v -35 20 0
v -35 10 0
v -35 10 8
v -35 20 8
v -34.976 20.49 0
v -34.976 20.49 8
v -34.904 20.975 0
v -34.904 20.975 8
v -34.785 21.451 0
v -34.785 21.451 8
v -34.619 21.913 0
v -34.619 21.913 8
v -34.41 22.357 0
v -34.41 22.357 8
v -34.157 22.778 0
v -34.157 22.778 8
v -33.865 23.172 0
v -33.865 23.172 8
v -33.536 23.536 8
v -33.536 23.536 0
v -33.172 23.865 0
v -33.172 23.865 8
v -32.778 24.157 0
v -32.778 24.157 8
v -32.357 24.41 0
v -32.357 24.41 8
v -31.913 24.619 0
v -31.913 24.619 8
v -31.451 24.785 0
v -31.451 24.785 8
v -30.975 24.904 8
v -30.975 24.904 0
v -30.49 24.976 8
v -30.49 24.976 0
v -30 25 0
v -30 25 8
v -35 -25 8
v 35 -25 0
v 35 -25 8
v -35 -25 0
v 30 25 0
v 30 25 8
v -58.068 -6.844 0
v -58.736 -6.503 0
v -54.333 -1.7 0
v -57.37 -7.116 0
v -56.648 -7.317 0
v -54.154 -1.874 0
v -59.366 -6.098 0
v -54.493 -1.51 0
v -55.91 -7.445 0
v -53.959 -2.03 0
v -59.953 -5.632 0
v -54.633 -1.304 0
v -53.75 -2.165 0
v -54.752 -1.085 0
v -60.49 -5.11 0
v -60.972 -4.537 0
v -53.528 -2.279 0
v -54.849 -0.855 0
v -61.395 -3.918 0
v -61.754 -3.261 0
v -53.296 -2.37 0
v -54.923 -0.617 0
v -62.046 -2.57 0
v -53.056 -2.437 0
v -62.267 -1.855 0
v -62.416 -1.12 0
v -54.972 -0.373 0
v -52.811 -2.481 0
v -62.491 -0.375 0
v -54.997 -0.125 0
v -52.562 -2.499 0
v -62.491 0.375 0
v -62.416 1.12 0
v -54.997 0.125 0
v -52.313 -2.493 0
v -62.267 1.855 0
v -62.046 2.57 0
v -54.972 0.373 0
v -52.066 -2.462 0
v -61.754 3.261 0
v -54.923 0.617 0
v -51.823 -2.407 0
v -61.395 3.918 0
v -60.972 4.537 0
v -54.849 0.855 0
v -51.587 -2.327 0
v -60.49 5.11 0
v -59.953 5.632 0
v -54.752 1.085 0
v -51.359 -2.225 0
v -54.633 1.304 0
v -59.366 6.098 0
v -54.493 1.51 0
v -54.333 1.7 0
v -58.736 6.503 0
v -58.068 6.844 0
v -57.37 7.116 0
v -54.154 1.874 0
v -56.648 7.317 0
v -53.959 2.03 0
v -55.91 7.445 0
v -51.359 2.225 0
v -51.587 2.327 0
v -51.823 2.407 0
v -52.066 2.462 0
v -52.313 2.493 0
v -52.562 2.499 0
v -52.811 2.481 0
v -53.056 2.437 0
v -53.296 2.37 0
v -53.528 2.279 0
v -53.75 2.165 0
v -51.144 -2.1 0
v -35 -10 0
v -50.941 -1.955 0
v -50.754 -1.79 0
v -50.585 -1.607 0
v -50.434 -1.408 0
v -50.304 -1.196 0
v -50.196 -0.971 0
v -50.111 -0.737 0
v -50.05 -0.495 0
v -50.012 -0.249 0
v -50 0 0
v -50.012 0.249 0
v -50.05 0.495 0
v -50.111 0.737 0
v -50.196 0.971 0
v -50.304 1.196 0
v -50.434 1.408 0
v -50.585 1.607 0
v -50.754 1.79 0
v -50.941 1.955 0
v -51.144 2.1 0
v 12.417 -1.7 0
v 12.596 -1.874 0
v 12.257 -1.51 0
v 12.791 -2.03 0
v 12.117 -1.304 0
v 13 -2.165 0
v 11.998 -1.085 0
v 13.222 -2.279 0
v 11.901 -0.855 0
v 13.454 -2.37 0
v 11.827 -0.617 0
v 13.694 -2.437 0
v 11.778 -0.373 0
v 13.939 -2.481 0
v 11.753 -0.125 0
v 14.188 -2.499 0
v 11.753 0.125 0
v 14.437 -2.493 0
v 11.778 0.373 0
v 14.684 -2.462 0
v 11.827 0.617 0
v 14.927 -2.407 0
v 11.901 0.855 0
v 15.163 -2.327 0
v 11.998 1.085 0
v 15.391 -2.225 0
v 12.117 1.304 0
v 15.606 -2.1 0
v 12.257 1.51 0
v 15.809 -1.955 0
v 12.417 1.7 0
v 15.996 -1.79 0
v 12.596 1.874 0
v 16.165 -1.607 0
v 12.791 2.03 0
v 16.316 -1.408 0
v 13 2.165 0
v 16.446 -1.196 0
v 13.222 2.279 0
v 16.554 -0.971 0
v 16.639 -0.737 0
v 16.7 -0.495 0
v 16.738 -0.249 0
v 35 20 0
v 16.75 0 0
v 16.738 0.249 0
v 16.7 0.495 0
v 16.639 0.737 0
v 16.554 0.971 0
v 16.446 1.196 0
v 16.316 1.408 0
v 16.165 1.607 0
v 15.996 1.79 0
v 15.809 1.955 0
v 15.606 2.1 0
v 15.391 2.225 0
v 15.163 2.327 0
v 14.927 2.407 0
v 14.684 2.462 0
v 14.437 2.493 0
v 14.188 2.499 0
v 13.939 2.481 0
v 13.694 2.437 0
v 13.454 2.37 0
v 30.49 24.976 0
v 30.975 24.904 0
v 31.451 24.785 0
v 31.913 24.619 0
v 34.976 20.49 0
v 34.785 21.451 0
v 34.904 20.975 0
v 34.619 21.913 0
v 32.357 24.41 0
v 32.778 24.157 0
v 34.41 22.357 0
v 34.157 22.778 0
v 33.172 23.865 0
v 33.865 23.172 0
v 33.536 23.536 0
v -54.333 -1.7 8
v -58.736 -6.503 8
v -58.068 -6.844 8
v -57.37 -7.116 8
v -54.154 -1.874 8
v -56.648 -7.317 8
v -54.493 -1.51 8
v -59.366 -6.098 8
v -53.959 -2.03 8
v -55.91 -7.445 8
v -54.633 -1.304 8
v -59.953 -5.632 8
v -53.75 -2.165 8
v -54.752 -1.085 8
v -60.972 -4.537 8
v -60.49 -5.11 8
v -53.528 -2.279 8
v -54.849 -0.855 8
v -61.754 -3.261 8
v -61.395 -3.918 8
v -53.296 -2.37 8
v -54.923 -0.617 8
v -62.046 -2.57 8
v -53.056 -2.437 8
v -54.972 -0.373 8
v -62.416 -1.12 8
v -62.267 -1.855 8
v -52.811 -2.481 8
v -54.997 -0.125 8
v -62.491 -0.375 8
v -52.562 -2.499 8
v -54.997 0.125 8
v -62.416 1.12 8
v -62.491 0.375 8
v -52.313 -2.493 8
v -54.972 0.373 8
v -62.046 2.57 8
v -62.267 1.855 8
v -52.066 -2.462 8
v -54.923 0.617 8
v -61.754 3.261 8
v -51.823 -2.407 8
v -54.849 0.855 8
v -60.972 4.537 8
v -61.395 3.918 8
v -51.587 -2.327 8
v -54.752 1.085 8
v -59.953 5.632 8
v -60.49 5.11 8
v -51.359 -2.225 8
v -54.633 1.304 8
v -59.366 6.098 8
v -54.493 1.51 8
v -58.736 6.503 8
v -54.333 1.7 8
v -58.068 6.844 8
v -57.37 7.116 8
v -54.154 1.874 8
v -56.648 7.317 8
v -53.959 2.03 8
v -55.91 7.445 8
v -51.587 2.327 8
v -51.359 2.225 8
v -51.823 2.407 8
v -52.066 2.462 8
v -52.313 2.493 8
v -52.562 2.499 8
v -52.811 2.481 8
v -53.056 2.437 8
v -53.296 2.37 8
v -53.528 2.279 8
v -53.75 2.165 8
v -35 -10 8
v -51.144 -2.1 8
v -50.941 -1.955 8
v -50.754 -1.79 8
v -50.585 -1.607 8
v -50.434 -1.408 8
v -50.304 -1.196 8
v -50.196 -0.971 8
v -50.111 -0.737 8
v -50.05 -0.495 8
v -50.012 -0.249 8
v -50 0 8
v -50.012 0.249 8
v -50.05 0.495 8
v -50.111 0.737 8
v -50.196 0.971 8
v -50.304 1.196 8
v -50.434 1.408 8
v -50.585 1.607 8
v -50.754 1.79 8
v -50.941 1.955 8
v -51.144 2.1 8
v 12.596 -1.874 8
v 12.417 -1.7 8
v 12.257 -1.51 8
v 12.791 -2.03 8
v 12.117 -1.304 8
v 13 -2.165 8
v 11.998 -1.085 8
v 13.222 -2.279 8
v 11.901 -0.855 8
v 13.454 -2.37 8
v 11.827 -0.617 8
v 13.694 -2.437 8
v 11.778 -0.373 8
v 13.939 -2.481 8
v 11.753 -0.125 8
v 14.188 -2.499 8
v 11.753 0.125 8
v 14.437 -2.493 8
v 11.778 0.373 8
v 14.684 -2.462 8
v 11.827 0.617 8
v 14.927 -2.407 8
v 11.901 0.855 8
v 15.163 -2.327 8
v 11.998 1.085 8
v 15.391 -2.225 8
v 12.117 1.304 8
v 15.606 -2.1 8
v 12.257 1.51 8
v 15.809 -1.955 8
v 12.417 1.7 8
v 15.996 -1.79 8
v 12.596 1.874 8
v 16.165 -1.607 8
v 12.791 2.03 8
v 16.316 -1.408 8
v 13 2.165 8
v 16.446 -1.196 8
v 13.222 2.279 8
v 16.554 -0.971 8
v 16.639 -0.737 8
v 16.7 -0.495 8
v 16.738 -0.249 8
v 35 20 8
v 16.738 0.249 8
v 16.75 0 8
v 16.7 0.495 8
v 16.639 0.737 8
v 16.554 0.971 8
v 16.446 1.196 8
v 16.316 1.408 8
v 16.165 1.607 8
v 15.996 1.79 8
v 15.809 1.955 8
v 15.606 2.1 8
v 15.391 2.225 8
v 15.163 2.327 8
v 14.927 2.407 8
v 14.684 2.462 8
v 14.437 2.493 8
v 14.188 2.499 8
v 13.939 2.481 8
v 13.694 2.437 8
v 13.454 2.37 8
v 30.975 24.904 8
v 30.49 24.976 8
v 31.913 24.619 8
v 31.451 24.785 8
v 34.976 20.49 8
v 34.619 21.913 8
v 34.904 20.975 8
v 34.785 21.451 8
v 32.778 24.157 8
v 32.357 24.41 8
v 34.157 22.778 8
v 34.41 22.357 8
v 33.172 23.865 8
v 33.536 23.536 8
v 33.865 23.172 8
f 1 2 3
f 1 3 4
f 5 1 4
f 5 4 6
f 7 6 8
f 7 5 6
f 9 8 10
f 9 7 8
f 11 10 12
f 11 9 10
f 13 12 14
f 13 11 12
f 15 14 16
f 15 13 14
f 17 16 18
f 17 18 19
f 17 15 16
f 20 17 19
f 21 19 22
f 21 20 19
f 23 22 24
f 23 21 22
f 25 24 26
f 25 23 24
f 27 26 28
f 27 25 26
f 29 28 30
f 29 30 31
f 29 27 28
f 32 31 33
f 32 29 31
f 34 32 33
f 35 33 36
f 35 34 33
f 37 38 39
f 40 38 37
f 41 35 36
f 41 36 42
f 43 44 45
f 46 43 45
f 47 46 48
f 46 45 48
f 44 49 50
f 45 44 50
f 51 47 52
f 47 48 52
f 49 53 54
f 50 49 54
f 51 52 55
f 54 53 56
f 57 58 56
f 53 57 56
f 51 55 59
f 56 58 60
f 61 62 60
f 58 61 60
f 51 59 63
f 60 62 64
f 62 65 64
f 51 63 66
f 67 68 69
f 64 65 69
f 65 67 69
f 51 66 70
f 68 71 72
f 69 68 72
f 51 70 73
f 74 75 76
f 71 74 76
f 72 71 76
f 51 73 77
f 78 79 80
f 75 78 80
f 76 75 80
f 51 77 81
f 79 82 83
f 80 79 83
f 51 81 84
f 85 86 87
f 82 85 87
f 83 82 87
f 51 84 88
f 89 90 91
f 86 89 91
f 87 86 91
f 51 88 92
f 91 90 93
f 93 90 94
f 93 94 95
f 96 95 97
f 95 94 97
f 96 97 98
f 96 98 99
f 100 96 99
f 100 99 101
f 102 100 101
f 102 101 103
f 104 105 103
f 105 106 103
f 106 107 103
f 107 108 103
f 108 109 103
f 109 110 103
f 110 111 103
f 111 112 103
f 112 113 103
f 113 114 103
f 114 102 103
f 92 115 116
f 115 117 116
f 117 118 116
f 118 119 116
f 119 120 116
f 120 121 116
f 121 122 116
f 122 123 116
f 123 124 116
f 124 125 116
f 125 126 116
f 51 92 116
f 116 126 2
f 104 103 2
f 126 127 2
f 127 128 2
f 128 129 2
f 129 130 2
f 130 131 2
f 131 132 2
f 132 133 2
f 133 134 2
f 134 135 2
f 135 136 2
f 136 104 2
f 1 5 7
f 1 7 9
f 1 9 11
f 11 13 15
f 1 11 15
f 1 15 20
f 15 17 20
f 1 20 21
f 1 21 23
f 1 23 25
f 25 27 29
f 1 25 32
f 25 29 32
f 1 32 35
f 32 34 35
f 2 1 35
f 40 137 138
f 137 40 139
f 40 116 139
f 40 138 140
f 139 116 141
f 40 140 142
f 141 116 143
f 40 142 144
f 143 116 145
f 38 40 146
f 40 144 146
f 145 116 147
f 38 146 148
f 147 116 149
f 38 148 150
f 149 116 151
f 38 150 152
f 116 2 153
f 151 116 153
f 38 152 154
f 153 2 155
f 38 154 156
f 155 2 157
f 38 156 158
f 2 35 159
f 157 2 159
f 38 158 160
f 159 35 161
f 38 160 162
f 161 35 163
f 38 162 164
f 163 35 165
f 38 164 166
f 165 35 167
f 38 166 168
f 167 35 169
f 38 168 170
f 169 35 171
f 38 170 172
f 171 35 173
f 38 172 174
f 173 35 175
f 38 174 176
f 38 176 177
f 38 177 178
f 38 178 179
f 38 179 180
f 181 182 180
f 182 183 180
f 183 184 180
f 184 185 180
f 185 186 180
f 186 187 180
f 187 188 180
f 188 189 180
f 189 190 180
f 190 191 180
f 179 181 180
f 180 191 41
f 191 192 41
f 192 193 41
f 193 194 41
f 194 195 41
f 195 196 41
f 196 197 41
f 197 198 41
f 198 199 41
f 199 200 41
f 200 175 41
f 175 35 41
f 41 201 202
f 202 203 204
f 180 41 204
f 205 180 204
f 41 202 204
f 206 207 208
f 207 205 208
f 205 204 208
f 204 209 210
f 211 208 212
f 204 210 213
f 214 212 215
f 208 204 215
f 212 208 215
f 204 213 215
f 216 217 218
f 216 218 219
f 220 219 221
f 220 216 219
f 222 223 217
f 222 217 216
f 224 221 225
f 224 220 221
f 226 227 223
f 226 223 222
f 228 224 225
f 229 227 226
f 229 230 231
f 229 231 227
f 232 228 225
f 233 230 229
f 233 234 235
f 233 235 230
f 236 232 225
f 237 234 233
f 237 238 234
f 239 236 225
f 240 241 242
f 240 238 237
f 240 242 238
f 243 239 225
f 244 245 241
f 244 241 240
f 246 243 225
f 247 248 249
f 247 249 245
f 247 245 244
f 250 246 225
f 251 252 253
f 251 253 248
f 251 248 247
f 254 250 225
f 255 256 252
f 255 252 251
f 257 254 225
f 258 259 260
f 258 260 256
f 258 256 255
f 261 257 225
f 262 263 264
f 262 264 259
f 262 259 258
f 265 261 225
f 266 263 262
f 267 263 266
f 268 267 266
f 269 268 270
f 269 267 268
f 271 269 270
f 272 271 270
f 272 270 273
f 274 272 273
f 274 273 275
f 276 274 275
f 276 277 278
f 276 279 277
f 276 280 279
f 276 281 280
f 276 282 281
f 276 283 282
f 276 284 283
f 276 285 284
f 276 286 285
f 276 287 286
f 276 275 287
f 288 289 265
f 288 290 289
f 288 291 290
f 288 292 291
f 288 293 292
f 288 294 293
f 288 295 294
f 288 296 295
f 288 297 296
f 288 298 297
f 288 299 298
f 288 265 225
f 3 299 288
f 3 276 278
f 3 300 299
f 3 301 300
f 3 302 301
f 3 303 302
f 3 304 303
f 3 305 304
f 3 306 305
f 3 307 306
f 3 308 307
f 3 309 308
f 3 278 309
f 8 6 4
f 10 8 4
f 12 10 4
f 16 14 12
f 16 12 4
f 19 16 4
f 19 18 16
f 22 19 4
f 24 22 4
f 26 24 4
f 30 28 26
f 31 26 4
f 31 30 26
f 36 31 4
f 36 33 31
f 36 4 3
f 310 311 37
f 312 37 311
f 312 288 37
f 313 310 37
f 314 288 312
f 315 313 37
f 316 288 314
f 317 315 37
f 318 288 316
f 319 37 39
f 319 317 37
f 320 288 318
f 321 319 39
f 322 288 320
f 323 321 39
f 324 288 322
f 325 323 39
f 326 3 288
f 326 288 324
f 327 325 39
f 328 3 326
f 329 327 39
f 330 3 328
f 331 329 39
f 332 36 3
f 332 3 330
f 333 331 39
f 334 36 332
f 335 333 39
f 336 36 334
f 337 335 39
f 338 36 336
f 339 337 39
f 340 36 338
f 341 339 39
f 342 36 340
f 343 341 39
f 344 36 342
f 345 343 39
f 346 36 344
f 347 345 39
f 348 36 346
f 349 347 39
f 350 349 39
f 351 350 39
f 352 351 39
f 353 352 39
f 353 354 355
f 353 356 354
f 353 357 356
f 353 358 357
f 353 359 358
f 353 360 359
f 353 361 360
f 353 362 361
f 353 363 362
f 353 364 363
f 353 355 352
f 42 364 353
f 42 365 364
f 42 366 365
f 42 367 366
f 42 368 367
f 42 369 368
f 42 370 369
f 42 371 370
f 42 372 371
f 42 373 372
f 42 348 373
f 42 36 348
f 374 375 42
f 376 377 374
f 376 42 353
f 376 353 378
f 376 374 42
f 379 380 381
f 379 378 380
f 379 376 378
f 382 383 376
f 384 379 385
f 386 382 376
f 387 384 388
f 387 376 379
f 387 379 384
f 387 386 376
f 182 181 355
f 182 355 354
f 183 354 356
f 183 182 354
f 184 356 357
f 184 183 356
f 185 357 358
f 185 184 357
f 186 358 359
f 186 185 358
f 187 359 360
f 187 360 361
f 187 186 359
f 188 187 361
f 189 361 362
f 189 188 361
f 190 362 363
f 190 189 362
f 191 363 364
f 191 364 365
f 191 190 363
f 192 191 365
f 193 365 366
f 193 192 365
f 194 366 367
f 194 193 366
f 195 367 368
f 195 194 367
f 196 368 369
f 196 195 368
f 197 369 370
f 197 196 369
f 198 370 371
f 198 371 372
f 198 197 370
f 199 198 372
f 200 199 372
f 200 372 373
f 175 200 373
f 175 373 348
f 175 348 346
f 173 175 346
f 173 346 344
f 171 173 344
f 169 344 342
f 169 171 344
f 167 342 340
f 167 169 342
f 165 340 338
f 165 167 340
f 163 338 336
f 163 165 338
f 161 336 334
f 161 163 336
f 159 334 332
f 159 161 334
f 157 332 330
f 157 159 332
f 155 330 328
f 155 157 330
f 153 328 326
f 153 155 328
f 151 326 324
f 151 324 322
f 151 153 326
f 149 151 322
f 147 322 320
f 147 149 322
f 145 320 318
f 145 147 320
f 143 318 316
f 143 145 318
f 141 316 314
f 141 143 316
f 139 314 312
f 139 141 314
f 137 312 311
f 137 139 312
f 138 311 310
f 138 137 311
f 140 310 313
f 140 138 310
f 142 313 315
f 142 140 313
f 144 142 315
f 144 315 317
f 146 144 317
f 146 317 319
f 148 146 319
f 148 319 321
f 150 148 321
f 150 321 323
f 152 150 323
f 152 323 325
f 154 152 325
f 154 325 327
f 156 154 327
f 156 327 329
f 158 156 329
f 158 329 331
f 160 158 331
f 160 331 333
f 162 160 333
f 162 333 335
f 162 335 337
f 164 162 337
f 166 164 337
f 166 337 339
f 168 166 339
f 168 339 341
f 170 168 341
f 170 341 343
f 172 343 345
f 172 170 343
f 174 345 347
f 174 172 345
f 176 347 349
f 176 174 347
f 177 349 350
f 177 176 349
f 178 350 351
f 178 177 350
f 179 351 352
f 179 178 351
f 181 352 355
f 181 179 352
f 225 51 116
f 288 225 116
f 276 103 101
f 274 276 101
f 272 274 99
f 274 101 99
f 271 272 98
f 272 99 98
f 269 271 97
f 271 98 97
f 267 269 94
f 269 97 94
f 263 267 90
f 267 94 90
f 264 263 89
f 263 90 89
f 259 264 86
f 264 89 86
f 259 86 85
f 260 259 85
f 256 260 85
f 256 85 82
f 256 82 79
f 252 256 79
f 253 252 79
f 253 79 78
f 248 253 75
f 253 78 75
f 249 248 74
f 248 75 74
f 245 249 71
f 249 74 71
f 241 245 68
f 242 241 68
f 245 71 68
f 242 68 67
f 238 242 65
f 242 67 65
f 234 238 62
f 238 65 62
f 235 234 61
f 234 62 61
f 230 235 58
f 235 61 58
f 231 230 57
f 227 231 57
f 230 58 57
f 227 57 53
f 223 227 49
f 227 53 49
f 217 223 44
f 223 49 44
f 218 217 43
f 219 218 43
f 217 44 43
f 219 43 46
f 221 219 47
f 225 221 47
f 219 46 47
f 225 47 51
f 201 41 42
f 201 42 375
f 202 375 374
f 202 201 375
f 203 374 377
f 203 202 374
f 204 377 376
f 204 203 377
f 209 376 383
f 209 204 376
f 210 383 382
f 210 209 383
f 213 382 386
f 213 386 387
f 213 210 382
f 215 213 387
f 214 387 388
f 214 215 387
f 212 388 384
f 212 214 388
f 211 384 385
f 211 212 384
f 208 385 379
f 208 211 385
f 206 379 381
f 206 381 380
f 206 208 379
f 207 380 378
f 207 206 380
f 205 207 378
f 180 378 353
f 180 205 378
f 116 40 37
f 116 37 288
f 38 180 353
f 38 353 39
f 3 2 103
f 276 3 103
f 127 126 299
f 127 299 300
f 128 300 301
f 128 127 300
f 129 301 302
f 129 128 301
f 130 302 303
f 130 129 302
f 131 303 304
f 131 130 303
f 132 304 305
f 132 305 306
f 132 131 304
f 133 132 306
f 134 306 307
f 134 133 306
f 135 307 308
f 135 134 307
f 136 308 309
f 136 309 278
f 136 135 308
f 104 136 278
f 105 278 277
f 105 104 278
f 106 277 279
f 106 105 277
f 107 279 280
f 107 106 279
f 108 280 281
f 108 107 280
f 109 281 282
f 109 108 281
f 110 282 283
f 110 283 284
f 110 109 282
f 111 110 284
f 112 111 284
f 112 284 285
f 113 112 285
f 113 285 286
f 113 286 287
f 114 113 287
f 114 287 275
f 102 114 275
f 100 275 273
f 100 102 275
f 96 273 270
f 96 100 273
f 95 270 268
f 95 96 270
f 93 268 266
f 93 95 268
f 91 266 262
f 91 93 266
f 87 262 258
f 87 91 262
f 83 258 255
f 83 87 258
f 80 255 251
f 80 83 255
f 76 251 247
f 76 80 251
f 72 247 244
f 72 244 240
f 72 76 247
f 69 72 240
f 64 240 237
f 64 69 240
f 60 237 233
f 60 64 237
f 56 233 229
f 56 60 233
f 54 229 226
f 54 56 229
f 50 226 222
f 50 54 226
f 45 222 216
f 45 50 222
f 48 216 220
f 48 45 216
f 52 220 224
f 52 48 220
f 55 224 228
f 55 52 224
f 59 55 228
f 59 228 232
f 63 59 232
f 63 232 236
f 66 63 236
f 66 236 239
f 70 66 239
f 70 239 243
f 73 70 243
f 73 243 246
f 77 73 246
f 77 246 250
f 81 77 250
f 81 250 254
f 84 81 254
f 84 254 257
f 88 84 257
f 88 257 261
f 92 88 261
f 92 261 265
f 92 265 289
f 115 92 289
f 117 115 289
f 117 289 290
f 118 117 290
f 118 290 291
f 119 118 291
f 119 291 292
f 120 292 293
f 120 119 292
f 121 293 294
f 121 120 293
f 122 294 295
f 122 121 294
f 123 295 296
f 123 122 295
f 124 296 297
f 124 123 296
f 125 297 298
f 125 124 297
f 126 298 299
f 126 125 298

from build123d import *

# Parameters (mm, degrees)
SKETCH1_R           = 2.5
BOSS_EXTRUDE3_DEPTH = 8


with BuildPart() as part:
    # Sketch1 → Boss-Extrude3 (new body)
    # profile 1 of 3: a face of its own
    with BuildSketch(Plane.XY):
        with BuildLine():
            ThreePointArc((30, 25), (33.535533906, 23.535533906), (35, 20))
            Line((35, 20), (35, -25))
            Line((35, -25), (-35, -25))
            Line((-35, -25), (-35, 20))
            ThreePointArc((-35, 20), (-33.535533906, 23.535533906), (-30, 25))
            Line((-30, 25), (30, 25))
        make_face()
        with Locations((14.25, 0)):
            Circle(SKETCH1_R, mode=Mode.SUBTRACT)
    # profile 2 of 3: a face of its own
    with BuildSketch(Plane.XY):
        with BuildLine():
            Line((-35, -10), (-35, 10))
            Line((-35, 10), (-55.909806165, 7.44461233))
            ThreePointArc((-55.909806165, 7.44461233), (-50.028760026, 5.615761134), (-47.5, 0))
            ThreePointArc((-47.5, 0), (-50.028760026, -5.615761134), (-55.909806165, -7.44461233))
            Line((-55.909806165, -7.44461233), (-35, -10))
        make_face()
    # profile 3 of 3: a face of its own
    with BuildSketch(Plane.XY):
        with BuildLine():
            ThreePointArc((-47.5, 0), (-50.028760026, 5.615761134), (-55.909806165, 7.44461233))
            ThreePointArc((-55.909806165, 7.44461233), (-62.5, 0), (-55.909806165, -7.44461233))
            ThreePointArc((-55.909806165, -7.44461233), (-50.028760026, -5.615761134), (-47.5, 0))
        make_face()
        with Locations((-52.5, 0)):
            Circle(SKETCH1_R, mode=Mode.SUBTRACT)
    extrude(amount=BOSS_EXTRUDE3_DEPTH)


solid = part.part
